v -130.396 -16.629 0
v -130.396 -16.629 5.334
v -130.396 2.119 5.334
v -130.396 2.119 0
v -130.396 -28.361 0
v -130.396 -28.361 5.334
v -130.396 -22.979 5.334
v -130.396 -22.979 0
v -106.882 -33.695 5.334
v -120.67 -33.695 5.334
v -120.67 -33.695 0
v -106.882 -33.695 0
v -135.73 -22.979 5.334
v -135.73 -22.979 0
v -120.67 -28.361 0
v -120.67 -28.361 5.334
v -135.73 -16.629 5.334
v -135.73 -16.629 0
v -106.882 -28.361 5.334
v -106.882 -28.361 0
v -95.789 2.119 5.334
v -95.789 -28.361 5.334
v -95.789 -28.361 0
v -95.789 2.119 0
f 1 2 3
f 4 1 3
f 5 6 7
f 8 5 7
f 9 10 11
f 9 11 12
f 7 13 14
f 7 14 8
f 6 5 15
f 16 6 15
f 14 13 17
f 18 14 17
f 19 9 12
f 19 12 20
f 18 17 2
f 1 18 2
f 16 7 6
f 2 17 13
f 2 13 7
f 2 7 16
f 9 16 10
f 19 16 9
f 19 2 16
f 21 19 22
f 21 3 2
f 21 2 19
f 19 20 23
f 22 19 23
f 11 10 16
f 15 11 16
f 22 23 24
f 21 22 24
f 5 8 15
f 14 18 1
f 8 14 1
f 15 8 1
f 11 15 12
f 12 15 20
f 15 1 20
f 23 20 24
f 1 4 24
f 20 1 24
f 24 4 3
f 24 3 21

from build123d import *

# Parameters (mm, degrees)
SKETCH1_W           = 76.2
SKETCH1_H           = 30.48
BOSS_EXTRUDE1_DEPTH = 5.334
CAVITY1_START       = -171.988852232
CAVITY1_OUTLINE_W   = 30.48
CAVITY1_OUTLINE_H   = 5.334
CAVITY1_DEPTH       = 41.5925
SKETCH2_W           = 5.334
SKETCH2_H           = 6.35
BOSS_EXTRUDE2_DEPTH = 5.334
SKETCH3_W           = 13.788269566
SKETCH3_H           = 5.334
BOSS_EXTRUDE3_DEPTH = 5.334


# Read off the part's stored shape, not the designer's step: Cavity1
with BuildPart() as part:
    # Sketch1 → Boss-Extrude1 (new body)
    with BuildSketch(Plane.XY):
        with Locations((-133.888852232, -13.121247947)):
            Rectangle(SKETCH1_W, SKETCH1_H)
    extrude(amount=BOSS_EXTRUDE1_DEPTH)

    # Cavity1 outline → Cavity1 (cut)
    with BuildSketch(Plane.YZ.offset(CAVITY1_START)):
        with Locations((-13.121247947, 2.667)):
            Rectangle(CAVITY1_OUTLINE_W, CAVITY1_OUTLINE_H)
    extrude(amount=CAVITY1_DEPTH, mode=Mode.SUBTRACT)

    # Sketch2 → Boss-Extrude2 (add)
    with BuildSketch(Plane.XY.offset(5.334)):
        with Locations((-133.063352232, -19.80374181)):
            Rectangle(SKETCH2_W, SKETCH2_H)
    extrude(amount=-BOSS_EXTRUDE2_DEPTH)

    # Sketch3 → Boss-Extrude3 (add)
    with BuildSketch(Plane.XY.offset(5.334)):
        with Locations((-113.775970546, -31.028247947)):
            Rectangle(SKETCH3_W, SKETCH3_H)
    extrude(amount=-BOSS_EXTRUDE3_DEPTH)


solid = part.part
